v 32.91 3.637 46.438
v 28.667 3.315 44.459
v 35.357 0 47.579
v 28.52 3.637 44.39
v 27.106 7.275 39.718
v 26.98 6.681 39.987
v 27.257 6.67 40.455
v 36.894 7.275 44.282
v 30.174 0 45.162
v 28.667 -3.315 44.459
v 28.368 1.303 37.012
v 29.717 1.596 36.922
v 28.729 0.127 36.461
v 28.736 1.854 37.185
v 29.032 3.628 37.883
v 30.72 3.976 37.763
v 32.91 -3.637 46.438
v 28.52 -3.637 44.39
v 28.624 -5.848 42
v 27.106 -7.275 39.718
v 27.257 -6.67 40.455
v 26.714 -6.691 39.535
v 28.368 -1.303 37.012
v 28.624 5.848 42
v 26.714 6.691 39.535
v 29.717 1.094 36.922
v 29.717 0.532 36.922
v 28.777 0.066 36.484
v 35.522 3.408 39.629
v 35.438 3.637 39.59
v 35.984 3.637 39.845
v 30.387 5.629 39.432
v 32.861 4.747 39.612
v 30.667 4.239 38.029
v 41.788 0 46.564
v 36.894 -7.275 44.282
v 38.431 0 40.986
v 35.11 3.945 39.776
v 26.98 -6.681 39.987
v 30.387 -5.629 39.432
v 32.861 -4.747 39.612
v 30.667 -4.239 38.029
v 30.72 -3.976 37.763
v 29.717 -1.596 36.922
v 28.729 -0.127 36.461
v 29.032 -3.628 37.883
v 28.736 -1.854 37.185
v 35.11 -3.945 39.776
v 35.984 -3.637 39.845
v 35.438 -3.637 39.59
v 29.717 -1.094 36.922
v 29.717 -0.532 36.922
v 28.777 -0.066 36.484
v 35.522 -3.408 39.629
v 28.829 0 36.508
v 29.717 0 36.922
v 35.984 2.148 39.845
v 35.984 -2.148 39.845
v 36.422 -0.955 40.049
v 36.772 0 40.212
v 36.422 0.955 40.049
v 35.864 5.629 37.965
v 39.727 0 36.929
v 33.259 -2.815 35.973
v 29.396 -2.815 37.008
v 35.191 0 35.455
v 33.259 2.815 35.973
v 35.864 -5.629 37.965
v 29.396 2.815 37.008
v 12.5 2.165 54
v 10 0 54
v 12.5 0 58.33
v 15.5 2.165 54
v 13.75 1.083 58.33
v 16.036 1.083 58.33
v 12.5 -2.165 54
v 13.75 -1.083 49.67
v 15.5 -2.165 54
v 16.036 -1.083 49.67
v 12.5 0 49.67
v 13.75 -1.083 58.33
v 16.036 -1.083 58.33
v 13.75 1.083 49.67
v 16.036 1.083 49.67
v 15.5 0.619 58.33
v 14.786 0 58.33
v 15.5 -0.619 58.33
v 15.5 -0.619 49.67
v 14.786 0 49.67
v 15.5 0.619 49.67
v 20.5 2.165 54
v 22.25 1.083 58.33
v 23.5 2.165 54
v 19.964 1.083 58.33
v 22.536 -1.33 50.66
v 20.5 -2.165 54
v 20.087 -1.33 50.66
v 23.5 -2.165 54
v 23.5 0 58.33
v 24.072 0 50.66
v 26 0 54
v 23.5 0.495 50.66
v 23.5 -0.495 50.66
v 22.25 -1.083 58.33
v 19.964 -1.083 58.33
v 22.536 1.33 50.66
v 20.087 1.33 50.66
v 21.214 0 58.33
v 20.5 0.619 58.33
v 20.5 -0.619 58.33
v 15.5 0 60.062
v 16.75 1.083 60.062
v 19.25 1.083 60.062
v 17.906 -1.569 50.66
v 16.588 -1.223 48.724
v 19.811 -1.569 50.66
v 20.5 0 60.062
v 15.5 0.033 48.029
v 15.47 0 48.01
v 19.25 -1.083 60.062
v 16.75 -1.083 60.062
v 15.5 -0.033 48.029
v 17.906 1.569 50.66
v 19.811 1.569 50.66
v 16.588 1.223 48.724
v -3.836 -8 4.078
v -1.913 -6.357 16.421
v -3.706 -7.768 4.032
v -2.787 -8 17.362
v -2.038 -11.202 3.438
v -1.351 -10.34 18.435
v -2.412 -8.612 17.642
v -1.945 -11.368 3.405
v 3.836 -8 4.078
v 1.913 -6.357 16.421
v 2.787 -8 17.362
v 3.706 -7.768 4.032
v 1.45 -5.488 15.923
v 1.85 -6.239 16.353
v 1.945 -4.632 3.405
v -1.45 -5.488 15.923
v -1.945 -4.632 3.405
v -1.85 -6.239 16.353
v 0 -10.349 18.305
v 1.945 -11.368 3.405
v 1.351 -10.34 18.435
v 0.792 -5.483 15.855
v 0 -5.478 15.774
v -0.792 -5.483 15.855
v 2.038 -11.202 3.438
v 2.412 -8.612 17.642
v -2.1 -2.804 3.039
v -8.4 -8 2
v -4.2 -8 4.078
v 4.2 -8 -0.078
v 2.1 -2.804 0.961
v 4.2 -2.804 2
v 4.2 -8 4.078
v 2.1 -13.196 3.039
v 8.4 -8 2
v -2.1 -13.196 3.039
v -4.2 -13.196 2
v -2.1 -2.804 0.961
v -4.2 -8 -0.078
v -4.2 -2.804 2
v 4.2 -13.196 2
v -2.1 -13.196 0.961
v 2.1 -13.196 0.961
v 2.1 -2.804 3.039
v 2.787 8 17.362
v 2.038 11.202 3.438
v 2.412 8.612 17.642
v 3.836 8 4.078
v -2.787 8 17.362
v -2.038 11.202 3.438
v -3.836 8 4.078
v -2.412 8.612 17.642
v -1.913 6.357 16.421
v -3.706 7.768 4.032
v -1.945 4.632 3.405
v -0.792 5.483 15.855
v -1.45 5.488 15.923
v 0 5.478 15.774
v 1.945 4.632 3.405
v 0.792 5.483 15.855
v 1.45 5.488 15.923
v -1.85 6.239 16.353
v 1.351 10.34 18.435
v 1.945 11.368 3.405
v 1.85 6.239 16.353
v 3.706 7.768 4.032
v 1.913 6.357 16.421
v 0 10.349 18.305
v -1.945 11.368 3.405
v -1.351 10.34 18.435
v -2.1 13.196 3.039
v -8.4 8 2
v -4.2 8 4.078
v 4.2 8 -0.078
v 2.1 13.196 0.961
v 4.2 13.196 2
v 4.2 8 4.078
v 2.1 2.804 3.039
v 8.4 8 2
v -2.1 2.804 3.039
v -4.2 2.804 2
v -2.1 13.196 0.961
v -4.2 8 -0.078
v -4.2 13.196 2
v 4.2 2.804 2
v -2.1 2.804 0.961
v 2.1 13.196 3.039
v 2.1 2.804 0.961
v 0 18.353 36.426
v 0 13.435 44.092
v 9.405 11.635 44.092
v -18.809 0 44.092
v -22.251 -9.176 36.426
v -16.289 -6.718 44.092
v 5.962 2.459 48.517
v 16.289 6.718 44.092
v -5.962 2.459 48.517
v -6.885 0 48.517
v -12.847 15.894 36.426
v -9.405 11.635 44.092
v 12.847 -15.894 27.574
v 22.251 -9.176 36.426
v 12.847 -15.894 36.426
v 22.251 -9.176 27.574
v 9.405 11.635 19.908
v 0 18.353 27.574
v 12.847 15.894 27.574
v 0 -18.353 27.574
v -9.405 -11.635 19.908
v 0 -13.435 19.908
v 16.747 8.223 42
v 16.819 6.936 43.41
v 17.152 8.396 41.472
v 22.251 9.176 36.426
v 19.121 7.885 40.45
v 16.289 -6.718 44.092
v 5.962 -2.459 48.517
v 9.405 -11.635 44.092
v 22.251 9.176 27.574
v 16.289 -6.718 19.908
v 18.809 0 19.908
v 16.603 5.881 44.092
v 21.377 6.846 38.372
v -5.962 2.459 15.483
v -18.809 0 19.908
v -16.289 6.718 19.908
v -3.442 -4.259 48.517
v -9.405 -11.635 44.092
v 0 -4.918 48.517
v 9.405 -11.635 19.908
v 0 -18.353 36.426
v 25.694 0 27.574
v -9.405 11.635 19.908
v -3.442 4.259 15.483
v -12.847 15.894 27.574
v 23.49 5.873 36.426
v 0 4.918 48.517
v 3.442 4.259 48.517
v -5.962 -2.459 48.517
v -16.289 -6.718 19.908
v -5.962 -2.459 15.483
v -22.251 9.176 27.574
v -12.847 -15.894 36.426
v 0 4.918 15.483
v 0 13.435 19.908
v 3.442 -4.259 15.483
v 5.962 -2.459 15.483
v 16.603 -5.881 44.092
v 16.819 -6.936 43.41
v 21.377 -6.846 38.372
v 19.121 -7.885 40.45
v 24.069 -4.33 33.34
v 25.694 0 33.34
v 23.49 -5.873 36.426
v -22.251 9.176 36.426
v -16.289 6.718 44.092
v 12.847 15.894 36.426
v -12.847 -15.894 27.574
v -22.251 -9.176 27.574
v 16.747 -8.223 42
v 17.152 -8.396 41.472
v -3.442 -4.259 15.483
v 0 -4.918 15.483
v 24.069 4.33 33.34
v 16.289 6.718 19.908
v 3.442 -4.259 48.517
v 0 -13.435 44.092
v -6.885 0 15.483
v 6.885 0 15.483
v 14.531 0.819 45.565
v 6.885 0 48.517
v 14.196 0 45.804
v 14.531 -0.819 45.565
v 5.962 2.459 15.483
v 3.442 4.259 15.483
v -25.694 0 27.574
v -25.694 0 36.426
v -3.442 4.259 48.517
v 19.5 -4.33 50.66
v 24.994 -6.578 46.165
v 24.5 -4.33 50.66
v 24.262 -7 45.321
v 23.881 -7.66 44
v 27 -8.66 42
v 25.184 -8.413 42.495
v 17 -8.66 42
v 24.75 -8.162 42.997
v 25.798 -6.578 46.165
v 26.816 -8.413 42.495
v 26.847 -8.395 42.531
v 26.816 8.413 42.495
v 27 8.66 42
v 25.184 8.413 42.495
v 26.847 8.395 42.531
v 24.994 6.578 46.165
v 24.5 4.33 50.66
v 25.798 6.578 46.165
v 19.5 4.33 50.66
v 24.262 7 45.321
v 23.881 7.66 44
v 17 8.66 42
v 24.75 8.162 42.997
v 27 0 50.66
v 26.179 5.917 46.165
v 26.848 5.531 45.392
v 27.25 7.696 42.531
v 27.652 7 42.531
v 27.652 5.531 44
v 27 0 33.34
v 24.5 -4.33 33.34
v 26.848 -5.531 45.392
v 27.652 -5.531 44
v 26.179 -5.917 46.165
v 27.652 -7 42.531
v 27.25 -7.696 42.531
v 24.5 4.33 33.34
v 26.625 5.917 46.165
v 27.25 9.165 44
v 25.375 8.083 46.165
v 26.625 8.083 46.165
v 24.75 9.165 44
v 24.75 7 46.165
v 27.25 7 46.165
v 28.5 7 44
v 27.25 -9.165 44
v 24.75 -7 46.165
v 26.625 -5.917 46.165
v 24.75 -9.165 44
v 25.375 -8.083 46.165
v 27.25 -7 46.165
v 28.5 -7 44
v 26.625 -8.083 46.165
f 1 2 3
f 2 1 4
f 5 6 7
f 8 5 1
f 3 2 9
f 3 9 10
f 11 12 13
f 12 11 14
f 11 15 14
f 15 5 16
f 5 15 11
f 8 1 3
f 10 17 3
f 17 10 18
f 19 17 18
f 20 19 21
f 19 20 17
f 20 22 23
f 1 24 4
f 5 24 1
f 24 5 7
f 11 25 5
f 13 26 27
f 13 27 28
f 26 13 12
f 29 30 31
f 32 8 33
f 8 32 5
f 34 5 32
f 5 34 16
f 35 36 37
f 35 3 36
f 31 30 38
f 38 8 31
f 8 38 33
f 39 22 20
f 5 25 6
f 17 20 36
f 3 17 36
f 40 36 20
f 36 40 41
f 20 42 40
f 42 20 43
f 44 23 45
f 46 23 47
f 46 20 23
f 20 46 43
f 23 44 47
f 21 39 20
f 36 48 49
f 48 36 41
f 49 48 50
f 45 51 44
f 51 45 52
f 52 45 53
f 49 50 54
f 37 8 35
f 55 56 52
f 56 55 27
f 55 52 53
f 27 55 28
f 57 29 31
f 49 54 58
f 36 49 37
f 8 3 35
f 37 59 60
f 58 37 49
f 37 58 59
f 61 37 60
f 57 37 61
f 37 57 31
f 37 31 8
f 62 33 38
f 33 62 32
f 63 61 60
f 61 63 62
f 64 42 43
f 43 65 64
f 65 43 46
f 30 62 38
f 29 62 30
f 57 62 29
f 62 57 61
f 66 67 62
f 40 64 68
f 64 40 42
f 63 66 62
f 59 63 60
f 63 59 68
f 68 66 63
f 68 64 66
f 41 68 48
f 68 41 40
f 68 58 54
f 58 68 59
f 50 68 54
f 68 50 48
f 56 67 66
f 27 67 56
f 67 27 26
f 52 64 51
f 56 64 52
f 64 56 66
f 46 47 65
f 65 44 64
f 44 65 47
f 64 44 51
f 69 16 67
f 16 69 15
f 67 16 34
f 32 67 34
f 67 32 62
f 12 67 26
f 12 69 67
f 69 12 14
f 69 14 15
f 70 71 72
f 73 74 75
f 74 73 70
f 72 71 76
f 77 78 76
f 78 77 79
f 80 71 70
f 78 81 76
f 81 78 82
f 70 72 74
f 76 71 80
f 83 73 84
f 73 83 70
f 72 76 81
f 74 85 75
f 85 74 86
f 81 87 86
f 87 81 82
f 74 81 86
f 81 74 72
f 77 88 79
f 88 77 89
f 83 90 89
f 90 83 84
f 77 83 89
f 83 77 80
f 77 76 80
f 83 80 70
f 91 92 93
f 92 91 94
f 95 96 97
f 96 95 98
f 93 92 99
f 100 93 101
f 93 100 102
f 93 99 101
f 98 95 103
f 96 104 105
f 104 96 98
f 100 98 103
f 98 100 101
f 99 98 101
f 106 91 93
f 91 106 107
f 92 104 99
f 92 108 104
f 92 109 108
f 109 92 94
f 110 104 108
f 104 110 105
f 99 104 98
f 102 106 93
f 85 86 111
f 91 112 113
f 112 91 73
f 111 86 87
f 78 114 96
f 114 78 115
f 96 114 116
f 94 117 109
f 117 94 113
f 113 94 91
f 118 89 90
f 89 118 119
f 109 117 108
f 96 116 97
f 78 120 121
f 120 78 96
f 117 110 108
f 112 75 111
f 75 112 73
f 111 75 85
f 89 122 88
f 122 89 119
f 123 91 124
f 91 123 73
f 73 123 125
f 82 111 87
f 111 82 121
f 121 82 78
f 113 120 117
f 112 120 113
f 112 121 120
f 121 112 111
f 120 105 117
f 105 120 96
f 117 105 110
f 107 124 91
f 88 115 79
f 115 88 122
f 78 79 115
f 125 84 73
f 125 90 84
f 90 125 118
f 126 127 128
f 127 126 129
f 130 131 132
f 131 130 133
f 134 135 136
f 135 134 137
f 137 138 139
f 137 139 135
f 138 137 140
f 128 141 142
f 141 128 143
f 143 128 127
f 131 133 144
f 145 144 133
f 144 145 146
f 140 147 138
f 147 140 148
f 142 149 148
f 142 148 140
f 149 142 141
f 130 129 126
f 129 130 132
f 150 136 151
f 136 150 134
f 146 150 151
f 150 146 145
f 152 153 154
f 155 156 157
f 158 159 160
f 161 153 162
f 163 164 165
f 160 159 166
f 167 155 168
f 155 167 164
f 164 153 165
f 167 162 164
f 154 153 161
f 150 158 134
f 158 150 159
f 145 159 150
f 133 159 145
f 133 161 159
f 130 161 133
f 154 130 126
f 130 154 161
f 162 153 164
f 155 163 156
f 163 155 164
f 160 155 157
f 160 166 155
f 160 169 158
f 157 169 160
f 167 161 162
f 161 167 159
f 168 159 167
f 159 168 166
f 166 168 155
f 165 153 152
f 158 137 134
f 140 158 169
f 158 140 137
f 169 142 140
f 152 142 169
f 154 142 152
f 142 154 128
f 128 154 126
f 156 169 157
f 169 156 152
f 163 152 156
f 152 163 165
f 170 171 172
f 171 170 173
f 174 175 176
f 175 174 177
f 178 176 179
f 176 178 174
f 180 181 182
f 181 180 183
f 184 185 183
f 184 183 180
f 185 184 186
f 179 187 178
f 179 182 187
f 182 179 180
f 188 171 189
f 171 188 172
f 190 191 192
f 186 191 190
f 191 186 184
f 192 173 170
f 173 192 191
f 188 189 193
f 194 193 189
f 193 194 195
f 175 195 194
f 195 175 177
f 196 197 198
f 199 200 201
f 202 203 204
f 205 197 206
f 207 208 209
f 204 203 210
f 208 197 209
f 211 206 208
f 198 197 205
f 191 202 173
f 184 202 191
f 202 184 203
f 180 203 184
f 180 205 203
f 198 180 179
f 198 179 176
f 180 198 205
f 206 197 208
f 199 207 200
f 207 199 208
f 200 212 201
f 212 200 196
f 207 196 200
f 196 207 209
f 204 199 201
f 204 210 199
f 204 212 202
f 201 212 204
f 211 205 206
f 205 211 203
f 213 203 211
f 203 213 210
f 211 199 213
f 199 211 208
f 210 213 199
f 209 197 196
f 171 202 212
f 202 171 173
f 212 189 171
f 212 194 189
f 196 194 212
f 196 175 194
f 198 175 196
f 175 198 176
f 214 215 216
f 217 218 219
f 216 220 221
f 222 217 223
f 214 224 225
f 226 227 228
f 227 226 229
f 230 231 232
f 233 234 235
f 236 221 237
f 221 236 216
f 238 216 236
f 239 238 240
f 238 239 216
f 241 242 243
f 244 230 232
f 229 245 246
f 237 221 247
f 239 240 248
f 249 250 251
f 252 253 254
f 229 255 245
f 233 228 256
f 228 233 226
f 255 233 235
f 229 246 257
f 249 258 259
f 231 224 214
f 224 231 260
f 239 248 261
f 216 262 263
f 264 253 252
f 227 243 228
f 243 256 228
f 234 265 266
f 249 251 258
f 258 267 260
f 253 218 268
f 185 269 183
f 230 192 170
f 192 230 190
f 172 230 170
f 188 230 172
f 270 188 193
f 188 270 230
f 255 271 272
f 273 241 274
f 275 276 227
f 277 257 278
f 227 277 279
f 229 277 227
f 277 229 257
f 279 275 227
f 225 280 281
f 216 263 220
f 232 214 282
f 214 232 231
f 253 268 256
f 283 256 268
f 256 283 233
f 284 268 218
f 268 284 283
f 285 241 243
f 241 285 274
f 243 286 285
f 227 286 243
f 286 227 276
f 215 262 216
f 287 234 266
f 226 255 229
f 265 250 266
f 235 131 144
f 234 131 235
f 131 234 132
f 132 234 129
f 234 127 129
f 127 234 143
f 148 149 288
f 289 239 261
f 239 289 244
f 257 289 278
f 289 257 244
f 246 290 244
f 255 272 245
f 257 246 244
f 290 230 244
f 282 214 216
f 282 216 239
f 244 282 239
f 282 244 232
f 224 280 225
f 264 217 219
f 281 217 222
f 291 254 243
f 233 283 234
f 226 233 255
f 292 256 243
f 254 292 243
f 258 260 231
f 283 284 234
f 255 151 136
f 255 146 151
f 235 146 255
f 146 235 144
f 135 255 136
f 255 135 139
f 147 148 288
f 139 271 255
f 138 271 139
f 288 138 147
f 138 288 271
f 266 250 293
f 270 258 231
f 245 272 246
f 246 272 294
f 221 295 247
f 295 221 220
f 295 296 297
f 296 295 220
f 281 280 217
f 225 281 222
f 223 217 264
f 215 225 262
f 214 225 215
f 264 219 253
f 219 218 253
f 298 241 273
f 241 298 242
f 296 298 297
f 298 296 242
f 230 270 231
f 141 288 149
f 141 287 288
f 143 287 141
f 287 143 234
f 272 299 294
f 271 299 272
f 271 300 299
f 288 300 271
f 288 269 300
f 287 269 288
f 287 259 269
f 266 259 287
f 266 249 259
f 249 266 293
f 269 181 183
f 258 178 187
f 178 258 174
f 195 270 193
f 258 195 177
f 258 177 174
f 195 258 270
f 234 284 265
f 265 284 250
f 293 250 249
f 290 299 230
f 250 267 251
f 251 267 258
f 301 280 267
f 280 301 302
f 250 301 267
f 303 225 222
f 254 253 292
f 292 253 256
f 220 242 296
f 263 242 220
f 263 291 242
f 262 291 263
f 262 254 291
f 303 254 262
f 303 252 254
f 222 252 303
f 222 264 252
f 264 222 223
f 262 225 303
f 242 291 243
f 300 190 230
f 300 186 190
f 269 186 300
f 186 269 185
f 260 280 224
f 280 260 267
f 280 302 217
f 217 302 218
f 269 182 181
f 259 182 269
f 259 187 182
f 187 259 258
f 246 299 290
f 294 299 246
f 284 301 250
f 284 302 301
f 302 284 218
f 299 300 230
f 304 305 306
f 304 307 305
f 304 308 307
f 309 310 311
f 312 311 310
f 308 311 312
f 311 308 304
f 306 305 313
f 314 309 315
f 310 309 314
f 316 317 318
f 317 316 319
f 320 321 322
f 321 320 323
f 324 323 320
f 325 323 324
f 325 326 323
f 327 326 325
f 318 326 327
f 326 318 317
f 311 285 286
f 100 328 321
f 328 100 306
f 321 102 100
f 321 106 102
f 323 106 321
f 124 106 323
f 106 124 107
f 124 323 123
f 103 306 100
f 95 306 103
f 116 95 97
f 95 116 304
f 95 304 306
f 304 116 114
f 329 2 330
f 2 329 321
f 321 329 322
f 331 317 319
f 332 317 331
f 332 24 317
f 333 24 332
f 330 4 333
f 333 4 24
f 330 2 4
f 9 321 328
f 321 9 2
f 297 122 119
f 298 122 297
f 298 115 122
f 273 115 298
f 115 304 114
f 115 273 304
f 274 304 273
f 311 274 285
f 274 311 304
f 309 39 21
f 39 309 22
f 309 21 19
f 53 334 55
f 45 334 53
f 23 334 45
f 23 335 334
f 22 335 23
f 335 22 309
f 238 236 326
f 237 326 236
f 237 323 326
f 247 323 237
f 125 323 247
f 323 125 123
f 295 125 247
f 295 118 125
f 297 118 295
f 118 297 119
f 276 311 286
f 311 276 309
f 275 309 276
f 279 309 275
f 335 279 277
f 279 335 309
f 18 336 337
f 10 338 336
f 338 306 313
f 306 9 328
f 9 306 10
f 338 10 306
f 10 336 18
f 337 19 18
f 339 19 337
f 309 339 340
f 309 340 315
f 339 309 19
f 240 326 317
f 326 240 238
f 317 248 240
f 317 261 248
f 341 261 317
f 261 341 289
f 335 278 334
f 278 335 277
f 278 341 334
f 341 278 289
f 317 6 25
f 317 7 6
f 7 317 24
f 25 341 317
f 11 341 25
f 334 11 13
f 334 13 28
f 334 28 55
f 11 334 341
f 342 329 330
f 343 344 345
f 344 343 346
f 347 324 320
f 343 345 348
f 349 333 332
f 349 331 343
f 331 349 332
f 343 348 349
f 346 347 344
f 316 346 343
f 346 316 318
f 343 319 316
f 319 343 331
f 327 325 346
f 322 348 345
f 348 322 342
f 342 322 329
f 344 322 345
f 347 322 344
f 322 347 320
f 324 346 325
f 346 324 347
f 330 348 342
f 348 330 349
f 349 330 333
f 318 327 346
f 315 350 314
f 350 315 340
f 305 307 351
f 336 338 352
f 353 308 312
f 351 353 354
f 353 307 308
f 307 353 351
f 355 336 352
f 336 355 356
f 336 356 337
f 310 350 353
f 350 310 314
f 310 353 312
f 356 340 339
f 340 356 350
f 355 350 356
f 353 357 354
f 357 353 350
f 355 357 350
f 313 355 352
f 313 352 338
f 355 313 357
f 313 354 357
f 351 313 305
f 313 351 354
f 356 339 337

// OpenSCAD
// Simple low-poly chicken (side view-ish)
// units = millimeters

$fn = 6;   // low resolution = fewer facets

translate([0,0,20])
{
    // Body (main oval)
    color("white")
    translate([0, 0, 12])
      scale([1.4, 1.0, 0.9])
        sphere(d = 38, $fn = 12);

    // Head
    color("white")
    translate([22, 0, 22])
      sphere(d = 20, $fn = 6);

    // Beak (two parts: upper + lower)
    color("orange")
    translate([32, 0, 22]) {
      // upper beak
      rotate([0, -25, 0])
        scale([1.8, 1.4, 0.7])
          sphere(d = 12, $fn = 6);
      
      // lower beak
      translate([0, 0, -3])
        rotate([0, 15, 0])
          scale([1.6, 1.3, 0.6])
            sphere(d = 10, $fn = 6);
    }

    // Comb (very simplified)
    color("red")
    translate([18, 0, 34]) {
        translate([-1*3, 0, 0])
          scale([1.0, 0.5, 1.4-abs(-1*0.4)])
            sphere(d = 10, $fn = 6);
        translate([1*3, 0, 0])
          scale([1.0, 0.5, 1.4-abs(1*0.4)])
            sphere(d = 10, $fn = 6);
        translate([0*3, 0, 0])
          scale([1.0, 0.5, 1.4-abs(0*0.4)])
            sphere(d = 10, $fn = 6);

    }

    // Eye (one visible side)
    color("black")
    translate([26, 7, 24])
      sphere(d = 5, $fn = 6);
    color("black")
    translate([26, -7, 24])
      sphere(d = 5, $fn = 6);

    // Tail feathers (simple fan)
//    if(0)
//    color("white")
//    for (a = [-30:15:30]) {
//      rotate([0, a, 0])
//        translate([0, 0, 8])
//          scale([0.7, 2.2, 0.4])
//            sphere(d = 24);
//    }

    // Legs (very basic cylinders + feet)
    color("pink")
    {
      // thigh
      translate([0, -8, -18])
          cylinder(h=19, d1=8, d2=5, $fn = 6);
      // foot (flat oval)
      translate([0, -8, -18])
        rotate([90, 0, 0])
          scale([1.4, 0.4, 1.0])
            sphere(d=12, $fn = 6);

      // thigh
      translate([0, 8, -18])
          cylinder(h=19, d1=8, d2=5, $fn = 6);
      // foot (flat oval)
      translate([0, 8, -18])
        rotate([90, 0, 0])
          scale([1.4, 0.4, 1.0])
            sphere(d=12, $fn = 6);
    }
}
